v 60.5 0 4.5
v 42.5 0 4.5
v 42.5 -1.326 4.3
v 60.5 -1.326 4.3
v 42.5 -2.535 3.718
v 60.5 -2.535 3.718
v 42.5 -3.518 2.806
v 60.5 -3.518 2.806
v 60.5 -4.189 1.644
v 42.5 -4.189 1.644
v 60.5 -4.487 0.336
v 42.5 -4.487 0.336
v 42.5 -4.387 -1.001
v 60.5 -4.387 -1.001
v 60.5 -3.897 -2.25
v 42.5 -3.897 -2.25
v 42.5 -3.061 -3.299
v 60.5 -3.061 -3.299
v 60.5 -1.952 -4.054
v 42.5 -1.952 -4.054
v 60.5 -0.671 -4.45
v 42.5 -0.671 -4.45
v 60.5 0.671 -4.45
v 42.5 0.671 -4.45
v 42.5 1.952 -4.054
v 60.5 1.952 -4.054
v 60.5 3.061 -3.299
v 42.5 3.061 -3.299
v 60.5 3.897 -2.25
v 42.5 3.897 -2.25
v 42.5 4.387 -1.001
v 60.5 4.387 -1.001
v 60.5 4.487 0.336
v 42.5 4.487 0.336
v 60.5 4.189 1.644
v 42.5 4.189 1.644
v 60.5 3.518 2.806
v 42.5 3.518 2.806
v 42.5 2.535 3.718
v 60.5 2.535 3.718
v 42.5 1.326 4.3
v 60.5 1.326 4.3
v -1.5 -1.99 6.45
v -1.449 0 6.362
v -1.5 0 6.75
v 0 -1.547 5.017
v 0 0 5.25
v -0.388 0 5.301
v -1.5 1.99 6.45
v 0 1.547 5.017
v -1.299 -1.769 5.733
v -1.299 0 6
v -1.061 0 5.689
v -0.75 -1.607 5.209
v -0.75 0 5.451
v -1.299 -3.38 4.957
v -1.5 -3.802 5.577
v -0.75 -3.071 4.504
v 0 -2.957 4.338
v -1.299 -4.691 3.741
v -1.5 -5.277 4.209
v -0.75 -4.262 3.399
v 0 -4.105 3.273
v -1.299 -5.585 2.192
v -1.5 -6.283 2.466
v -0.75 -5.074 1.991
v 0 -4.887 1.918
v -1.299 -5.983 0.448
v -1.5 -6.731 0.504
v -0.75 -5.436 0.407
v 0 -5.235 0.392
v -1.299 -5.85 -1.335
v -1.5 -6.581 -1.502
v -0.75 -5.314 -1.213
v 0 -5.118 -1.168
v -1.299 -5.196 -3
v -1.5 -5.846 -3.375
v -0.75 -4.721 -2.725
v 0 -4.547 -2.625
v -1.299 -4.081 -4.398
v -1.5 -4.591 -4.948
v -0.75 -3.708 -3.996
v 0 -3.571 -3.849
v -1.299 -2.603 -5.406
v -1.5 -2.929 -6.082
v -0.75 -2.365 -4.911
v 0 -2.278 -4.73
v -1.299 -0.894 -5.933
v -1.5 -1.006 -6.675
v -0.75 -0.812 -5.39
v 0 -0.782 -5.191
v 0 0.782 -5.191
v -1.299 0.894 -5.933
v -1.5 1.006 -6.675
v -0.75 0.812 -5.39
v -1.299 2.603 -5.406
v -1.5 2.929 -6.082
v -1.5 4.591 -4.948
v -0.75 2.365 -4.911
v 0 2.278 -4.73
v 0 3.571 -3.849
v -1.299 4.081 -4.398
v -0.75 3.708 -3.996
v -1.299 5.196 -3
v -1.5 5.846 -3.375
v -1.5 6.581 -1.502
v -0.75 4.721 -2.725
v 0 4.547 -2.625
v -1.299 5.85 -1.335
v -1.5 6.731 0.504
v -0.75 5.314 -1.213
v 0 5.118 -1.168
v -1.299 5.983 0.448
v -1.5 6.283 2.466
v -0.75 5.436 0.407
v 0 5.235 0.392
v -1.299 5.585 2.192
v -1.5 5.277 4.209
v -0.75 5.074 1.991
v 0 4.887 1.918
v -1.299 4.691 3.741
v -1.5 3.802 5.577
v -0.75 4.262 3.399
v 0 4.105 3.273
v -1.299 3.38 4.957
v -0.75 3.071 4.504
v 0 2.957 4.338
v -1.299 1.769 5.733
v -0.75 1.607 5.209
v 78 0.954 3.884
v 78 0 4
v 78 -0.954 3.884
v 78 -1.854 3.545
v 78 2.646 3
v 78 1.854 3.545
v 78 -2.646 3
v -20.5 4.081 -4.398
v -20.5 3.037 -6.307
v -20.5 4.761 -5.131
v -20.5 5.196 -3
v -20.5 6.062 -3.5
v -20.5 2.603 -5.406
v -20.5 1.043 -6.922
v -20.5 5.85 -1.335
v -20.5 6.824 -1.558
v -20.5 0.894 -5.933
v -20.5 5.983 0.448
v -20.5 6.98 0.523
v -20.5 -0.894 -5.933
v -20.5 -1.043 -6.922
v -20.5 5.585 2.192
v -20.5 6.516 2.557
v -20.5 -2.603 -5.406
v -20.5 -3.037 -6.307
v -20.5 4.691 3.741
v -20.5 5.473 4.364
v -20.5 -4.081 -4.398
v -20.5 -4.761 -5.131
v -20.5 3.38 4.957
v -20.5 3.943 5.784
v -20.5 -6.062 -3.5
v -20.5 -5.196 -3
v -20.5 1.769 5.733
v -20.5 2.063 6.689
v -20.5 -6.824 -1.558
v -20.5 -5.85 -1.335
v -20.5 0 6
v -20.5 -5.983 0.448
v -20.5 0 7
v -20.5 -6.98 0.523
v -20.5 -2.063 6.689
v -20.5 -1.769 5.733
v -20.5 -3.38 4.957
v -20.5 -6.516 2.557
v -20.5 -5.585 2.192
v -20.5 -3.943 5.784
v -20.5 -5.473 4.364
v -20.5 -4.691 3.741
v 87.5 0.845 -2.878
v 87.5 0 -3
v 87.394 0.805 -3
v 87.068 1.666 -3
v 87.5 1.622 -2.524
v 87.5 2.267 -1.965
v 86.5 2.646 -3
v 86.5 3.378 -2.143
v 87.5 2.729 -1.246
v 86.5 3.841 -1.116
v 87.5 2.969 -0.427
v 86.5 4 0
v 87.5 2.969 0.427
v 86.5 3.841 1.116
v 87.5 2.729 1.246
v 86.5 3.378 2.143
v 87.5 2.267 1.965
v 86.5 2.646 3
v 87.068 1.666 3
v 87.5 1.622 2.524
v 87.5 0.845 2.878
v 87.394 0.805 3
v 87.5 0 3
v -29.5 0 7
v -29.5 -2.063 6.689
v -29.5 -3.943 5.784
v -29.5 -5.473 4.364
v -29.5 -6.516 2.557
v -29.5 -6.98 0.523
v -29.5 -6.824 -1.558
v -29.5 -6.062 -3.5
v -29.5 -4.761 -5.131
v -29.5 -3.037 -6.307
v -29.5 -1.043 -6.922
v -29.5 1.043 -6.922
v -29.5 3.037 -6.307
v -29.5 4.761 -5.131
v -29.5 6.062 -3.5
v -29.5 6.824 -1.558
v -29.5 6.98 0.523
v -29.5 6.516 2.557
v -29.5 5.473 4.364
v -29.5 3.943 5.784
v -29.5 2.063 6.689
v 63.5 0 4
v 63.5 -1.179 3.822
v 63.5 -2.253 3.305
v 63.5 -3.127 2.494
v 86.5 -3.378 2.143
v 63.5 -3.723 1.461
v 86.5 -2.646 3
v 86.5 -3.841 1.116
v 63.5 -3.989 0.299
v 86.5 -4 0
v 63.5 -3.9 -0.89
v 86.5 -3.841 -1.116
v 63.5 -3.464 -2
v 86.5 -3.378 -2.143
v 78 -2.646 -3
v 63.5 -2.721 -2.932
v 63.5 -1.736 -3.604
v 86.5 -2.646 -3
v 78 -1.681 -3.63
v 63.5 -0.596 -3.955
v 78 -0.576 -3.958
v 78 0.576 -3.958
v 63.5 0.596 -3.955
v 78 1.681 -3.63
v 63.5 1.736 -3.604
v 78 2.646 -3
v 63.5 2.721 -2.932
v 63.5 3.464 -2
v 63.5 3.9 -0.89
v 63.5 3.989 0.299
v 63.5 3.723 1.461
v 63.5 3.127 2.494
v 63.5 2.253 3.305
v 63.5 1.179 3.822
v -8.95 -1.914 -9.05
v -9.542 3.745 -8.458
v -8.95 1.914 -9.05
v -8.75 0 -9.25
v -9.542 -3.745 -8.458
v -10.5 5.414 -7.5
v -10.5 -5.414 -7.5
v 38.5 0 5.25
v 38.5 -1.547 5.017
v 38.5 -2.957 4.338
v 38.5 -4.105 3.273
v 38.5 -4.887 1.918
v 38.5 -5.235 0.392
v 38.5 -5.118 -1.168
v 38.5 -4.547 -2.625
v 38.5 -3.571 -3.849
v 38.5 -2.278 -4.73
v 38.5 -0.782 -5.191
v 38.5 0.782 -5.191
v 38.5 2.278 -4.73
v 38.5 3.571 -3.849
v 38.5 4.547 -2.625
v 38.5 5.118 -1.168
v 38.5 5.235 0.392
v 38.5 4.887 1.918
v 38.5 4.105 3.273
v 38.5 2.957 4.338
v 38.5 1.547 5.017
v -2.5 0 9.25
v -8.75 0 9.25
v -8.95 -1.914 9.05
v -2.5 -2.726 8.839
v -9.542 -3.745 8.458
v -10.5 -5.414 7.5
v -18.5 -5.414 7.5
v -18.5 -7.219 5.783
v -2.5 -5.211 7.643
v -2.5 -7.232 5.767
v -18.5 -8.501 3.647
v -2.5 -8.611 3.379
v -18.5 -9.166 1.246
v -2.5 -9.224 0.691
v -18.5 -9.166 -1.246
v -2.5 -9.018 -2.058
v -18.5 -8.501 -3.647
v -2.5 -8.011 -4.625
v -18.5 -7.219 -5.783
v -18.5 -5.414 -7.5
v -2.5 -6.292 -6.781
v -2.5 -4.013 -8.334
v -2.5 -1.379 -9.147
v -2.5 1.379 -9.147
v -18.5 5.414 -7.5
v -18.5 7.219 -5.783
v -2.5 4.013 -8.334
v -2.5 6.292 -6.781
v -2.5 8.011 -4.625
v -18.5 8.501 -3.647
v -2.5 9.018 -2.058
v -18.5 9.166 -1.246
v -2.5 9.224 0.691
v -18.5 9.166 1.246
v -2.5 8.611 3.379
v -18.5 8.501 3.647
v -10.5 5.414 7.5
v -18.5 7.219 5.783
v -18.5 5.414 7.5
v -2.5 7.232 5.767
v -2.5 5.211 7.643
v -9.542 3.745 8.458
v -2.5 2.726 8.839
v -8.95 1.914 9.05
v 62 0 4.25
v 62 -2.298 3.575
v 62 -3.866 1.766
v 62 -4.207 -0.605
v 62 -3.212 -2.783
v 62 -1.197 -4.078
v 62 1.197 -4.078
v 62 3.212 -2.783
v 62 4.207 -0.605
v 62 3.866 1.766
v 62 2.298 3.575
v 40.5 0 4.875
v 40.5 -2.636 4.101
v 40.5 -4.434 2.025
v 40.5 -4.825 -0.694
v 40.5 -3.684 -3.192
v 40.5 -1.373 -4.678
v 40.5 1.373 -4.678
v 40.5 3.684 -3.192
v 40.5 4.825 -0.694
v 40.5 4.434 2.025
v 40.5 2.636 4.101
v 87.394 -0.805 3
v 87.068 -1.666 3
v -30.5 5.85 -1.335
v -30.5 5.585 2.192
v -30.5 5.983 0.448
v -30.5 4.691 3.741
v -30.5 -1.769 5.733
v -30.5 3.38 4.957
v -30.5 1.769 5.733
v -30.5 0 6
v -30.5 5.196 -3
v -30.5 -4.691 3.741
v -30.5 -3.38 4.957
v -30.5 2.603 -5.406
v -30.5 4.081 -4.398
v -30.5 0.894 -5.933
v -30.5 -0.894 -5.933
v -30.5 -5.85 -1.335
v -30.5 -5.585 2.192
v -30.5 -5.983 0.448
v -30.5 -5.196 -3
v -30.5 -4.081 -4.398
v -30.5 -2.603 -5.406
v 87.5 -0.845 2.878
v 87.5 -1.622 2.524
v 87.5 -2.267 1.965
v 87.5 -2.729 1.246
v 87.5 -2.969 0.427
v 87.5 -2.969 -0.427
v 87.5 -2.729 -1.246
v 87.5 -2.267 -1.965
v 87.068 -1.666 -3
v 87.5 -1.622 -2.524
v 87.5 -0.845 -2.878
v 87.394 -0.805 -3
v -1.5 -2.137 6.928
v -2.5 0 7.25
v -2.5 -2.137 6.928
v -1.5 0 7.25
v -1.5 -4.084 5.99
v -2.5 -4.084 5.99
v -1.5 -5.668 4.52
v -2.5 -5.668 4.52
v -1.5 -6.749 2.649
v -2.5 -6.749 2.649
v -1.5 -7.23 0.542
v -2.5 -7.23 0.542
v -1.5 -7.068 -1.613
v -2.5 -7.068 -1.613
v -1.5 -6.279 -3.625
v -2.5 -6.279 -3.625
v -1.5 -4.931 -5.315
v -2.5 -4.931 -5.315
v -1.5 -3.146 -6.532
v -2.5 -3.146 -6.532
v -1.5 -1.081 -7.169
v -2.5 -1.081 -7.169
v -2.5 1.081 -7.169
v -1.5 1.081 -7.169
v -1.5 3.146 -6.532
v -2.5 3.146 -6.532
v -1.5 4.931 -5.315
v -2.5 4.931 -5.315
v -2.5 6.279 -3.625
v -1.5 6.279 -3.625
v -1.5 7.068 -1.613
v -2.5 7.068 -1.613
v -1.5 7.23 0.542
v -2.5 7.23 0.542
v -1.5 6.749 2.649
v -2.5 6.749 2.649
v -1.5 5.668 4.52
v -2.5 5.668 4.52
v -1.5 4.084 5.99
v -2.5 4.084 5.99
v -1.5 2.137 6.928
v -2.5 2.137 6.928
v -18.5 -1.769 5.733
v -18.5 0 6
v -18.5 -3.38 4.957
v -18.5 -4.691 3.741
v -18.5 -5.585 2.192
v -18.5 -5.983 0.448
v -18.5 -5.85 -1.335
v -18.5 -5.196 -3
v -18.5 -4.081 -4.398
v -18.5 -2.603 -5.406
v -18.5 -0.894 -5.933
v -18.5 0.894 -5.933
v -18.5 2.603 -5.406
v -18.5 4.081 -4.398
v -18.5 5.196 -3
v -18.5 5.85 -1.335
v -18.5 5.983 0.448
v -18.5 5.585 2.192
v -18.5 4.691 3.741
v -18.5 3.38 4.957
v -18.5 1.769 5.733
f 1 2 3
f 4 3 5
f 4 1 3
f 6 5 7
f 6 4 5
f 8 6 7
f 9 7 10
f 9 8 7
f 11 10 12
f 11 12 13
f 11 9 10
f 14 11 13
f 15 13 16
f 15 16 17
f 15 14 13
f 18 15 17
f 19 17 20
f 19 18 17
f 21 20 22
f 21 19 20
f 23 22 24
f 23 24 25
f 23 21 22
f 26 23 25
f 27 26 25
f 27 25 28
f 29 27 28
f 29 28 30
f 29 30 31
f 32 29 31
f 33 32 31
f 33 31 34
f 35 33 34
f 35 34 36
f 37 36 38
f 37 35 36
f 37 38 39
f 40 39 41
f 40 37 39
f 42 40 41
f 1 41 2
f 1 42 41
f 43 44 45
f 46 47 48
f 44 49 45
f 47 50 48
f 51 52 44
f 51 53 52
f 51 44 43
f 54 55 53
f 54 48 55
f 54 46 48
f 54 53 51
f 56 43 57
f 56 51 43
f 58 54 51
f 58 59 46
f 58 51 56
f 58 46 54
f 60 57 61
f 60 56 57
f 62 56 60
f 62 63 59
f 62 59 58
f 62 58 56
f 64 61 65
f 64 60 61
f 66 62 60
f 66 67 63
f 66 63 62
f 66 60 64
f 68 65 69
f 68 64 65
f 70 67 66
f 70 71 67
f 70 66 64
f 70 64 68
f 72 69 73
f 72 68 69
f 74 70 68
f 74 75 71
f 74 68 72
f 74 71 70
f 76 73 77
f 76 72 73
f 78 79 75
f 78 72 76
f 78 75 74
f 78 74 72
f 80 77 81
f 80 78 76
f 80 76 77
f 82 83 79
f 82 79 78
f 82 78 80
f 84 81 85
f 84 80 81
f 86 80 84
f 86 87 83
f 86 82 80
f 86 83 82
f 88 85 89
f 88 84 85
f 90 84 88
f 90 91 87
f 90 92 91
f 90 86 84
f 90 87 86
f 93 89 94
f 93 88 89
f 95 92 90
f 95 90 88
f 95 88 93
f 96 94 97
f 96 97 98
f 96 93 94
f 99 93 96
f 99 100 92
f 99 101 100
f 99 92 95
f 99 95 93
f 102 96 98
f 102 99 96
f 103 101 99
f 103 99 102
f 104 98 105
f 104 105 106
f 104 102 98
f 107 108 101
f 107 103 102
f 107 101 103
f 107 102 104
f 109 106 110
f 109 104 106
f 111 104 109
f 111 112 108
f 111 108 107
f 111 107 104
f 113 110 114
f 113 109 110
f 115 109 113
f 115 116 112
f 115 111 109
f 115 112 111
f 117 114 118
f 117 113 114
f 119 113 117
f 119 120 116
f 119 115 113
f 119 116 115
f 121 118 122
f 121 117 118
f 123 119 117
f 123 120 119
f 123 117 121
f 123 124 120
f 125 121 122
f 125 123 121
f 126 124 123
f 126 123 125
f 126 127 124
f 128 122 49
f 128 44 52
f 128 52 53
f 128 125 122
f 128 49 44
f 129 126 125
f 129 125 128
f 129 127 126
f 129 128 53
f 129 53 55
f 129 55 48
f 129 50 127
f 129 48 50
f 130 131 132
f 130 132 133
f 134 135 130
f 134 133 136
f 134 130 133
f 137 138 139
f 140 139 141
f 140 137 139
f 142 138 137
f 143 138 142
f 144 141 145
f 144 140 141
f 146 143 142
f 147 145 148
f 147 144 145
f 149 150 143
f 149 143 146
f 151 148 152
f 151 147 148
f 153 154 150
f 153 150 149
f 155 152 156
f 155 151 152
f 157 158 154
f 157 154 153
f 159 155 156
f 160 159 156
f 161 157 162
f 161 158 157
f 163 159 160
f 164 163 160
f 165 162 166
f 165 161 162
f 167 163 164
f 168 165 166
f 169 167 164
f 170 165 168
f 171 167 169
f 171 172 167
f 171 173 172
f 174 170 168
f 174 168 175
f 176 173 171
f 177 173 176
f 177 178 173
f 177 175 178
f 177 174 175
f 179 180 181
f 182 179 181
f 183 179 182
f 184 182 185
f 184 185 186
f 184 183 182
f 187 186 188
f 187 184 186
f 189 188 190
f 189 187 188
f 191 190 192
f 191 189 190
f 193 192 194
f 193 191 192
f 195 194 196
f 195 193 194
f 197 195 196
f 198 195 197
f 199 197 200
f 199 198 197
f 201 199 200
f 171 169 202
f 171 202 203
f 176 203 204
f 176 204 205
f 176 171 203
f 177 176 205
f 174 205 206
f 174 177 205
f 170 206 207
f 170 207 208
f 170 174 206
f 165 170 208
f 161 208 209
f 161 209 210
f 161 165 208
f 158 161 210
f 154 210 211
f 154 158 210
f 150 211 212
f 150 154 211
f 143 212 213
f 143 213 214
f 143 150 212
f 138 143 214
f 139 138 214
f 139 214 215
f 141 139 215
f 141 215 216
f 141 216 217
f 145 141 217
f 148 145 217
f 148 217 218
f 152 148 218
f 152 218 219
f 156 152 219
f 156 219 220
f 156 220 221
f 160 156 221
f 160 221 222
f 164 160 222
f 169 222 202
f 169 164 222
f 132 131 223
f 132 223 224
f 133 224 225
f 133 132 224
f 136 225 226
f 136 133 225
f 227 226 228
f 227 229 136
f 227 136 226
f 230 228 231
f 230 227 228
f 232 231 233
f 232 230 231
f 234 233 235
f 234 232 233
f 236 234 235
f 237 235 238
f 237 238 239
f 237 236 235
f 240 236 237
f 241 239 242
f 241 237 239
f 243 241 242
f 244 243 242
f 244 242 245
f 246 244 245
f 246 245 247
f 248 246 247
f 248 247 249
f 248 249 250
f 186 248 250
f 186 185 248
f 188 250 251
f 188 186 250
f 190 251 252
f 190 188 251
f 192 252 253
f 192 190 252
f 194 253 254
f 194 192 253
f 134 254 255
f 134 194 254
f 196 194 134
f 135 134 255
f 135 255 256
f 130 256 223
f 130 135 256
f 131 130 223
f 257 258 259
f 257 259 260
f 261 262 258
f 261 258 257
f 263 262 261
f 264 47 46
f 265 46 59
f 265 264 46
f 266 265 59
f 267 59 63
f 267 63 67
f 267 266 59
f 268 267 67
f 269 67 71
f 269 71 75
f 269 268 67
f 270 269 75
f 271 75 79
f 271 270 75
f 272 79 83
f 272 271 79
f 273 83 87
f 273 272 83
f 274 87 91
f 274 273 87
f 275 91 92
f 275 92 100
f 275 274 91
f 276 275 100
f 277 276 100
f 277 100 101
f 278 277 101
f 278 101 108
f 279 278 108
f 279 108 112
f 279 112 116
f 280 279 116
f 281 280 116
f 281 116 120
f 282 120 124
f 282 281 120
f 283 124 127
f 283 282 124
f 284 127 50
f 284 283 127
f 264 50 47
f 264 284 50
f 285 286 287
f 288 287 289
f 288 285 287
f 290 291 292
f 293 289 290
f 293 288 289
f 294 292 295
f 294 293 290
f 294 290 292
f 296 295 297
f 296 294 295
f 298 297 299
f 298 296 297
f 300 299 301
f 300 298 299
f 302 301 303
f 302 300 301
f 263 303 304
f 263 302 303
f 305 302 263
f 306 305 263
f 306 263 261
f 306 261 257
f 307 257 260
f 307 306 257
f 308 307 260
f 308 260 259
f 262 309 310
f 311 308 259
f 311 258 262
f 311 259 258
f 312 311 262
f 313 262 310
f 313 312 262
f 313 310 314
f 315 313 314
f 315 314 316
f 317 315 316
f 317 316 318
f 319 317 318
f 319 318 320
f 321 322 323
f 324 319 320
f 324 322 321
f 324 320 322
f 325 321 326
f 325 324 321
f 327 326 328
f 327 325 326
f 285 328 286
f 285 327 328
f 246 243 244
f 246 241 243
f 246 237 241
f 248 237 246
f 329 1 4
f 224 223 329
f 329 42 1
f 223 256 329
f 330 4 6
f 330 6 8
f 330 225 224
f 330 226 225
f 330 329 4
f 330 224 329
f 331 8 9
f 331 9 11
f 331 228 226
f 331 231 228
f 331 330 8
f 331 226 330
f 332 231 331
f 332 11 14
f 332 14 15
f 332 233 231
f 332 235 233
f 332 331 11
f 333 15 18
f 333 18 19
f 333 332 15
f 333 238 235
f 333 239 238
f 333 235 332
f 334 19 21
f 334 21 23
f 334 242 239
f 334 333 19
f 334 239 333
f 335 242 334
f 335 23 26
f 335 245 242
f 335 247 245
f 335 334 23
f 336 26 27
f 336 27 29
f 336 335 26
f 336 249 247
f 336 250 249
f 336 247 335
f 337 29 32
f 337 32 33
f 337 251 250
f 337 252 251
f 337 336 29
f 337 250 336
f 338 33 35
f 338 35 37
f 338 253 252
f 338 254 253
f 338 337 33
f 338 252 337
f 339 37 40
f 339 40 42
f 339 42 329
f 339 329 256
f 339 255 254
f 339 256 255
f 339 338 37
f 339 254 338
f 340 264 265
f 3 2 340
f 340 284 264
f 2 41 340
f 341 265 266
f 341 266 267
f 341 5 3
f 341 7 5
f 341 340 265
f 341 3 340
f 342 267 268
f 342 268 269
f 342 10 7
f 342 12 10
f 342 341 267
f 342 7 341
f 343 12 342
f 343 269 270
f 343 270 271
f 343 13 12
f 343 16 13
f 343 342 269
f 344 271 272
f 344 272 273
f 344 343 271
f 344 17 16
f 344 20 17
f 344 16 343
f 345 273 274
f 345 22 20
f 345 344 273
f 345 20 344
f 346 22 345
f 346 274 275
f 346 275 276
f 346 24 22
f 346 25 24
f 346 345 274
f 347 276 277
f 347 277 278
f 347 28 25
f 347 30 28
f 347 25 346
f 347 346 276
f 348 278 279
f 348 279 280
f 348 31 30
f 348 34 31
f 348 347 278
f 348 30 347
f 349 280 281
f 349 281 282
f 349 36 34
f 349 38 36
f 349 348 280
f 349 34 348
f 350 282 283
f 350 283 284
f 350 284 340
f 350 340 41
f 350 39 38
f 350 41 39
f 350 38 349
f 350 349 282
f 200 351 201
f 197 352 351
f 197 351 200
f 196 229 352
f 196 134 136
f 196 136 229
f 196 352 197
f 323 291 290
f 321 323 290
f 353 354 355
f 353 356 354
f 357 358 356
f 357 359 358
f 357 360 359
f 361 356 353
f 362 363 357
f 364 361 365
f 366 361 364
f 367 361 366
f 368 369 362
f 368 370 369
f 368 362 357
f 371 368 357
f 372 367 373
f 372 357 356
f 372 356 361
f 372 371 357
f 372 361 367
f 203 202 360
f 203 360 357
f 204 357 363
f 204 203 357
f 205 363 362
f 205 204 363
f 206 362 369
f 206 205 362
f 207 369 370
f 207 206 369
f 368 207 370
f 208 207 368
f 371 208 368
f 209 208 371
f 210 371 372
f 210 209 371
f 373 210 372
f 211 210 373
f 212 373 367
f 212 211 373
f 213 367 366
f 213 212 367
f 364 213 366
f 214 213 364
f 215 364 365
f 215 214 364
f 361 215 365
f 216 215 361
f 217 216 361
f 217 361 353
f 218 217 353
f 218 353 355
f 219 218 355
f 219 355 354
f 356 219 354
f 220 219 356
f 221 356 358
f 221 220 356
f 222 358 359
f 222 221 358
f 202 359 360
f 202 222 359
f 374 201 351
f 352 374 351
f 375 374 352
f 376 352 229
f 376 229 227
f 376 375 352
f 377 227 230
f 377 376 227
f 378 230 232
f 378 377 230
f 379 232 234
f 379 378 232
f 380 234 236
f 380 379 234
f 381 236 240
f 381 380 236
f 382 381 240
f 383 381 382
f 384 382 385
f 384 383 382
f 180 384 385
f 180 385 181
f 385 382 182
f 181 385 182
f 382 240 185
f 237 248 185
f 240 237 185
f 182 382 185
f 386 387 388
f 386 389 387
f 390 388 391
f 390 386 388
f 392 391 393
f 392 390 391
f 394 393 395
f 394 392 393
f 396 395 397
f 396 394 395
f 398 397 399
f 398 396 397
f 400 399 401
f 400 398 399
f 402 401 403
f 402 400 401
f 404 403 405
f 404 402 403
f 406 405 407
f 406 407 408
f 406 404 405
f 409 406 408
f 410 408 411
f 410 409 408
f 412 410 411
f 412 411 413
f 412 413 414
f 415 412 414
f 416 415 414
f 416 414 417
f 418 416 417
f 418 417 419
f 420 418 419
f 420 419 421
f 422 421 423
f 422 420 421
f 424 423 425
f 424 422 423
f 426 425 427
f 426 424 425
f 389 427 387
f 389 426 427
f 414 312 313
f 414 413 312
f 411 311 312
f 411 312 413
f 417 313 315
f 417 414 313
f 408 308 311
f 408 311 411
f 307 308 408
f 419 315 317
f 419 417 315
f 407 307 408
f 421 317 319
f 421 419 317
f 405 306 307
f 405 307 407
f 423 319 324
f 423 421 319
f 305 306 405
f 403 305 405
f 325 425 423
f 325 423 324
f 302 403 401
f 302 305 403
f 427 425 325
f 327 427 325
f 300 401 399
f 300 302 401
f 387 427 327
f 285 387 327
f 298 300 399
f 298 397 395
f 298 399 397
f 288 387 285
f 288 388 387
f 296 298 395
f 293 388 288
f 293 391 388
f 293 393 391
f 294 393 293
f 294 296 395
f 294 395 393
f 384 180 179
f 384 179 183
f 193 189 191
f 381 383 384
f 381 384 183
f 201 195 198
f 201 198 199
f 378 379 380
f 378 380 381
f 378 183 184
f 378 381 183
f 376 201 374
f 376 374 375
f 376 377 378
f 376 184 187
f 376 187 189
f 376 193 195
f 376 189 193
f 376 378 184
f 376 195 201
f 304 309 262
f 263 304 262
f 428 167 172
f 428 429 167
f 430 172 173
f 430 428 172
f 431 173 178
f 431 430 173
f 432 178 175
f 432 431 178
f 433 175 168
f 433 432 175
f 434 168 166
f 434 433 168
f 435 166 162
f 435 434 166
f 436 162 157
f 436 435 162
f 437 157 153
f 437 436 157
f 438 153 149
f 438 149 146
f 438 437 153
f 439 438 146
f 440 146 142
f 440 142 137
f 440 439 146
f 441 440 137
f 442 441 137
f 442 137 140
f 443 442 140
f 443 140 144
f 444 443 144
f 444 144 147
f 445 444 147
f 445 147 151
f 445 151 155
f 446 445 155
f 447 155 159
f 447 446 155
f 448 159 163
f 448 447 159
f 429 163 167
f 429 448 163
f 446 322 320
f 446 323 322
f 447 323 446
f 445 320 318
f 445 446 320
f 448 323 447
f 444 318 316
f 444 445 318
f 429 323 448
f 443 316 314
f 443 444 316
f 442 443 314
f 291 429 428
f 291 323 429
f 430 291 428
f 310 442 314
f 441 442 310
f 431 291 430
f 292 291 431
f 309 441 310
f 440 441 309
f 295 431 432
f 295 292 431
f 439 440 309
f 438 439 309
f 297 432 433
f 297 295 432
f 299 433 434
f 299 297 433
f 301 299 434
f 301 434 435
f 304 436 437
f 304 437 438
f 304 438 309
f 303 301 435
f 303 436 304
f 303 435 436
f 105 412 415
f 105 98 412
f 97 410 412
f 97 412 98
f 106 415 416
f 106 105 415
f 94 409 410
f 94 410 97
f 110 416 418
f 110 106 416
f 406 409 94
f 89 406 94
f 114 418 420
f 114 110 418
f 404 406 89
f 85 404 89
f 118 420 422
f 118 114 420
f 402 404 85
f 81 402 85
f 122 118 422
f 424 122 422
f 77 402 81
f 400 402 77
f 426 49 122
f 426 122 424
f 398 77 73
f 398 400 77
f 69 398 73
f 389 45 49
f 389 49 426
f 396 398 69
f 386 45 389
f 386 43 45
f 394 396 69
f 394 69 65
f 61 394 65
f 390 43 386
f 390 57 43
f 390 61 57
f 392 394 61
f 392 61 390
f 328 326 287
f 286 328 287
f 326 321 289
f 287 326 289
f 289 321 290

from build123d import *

# Parameters (mm, degrees)
CHANFREIN1_SIZE              = 1
ESQUISSE2_W                  = 9.5
ESQUISSE2_H                  = 1
ENL_V_MAT_EXTRU_1_DEPTH      = 10.25
ENL_V_MAT_EXTRU_1_DEPTH_BACK = 10.25
ENL_V_MAT_EXTRU_3_DEPTH      = 10.25
ENL_V_MAT_EXTRU_3_DEPTH_BACK = 10.25


with BuildPart() as part:
    # Esquisse1 → Révolution1 (revolve)
    with BuildSketch(Plane.XY, mode=Mode.PRIVATE) as r_volution1_sk:
        with BuildLine():
            Line((-30.5, 0), (-30.5, 7))
            Line((-30.5, 7), (-20.5, 7))
            Line((-20.5, 7), (-20.5, 6))
            Line((-20.5, 6), (-18.5, 6))
            Line((-18.5, 6), (-18.5, 9.25))
            Line((-18.5, 9.25), (-2.5, 9.25))
            Line((-2.5, 9.25), (-2.5, 7.25))
            Line((-2.5, 7.25), (-1.5, 7.25))
            Line((-1.5, 7.25), (-1.5, 6.75))
            ThreePointArc((-1.5, 6.75), (-1.060660172, 5.689339828), (0, 5.25))
            Line((0, 5.25), (38.5, 5.25))
            Line((38.5, 5.25), (42.5, 4.5))
            Line((42.5, 4.5), (60.5, 4.5))
            Line((60.5, 4.5), (63.5, 4))
            Line((63.5, 4), (87.5, 4))
            Line((87.5, 4), (87.5, 0))
            Line((87.5, 0), (-30.5, 0))
        make_face()
    revolve(r_volution1_sk.sketch.rotate(Axis((-56.136256415, 0, 0), (1, 0, 0)), 90), axis=Axis((-56.136256415, 0, 0), (1, 0, 0)))  # turned: the seam where the file's is

    # Chanfrein1
    chanfrein1_edges = [part.edges().sort_by_distance(p)[0] for p in [
        (87.5, 0, -4),
        (-30.5, 0, -7),
    ]]
    chamfer(chanfrein1_edges, length=CHANFREIN1_SIZE)

    # Esquisse2 → Enlèv. mat.-Extru.1 (cut, two sides)
    with BuildSketch(Plane(origin=(0, 0, 0), x_dir=(1, 0, 0), z_dir=(0, 1, 0))) as enl_v_mat_extru_1_sk:
        with Locations((82.75, 3.5)):
            Rectangle(ESQUISSE2_W, ESQUISSE2_H)
        with Locations((82.75, -3.5)):
            Rectangle(ESQUISSE2_W, ESQUISSE2_H)
    extrude(amount=ENL_V_MAT_EXTRU_1_DEPTH, mode=Mode.SUBTRACT)
    extrude(enl_v_mat_extru_1_sk.sketch, amount=-ENL_V_MAT_EXTRU_1_DEPTH_BACK, mode=Mode.SUBTRACT)

    # Esquisse4 → Enlèv. mat.-Extru.3 (cut, two sides)
    with BuildSketch(Plane(origin=(0, 0, 0), x_dir=(1, 0, 0), z_dir=(0, 1, 0))) as enl_v_mat_extru_3_sk:
        Polygon((-10.5, 7.5), (-8.75, 9.25), (-18.5, 9.25), (-18.5, 7.5), align=None)
        Polygon((-18.5, -7.5), (-10.5, -7.5), (-8.75, -9.25), (-18.5, -9.25), align=None)
    extrude(amount=ENL_V_MAT_EXTRU_3_DEPTH, mode=Mode.SUBTRACT)
    extrude(enl_v_mat_extru_3_sk.sketch, amount=-ENL_V_MAT_EXTRU_3_DEPTH_BACK, mode=Mode.SUBTRACT)


solid = part.part
